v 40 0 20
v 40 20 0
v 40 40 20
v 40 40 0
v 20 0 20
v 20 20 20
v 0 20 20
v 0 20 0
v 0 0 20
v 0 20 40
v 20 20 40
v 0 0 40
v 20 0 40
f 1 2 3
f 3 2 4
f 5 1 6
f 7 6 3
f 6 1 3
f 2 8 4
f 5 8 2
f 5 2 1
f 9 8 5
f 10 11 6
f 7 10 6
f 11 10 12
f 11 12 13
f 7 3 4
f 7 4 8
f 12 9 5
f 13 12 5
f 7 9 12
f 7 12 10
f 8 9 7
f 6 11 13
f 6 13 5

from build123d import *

# Parameters (mm, degrees)
SKETCH1_W           = 40
SKETCH1_H           = 40
BOSS_EXTRUDE1_DEPTH = 40
CUT_EXTRUDE1_DEPTH  = 40
SKETCH3_W           = 20
SKETCH3_H           = 20
CUT_EXTRUDE2_DEPTH  = 40
SKETCH5_W           = 20
SKETCH5_H           = 20
CUT_EXTRUDE4_DEPTH  = 40
CUT_EXTRUDE5_DEPTH  = 40


with BuildPart() as part:
    # Sketch1 → Boss-Extrude1 (new body)
    with BuildSketch(Plane.XY):
        with Locations((20, 20)):
            Rectangle(SKETCH1_W, SKETCH1_H)
    extrude(amount=BOSS_EXTRUDE1_DEPTH)

    # Sketch2 → Cut-Extrude1 (cut)
    with BuildSketch(Plane.XY.offset(40)):
        Polygon((40, 40), (0, 20), (0, 40), align=None)
    extrude(amount=-CUT_EXTRUDE1_DEPTH, mode=Mode.SUBTRACT)

    # Sketch3 → Cut-Extrude2 (cut)
    with BuildSketch(Plane(origin=(40, 0, 0), x_dir=(0, 0, -1), z_dir=(1, 0, 0))):
        with Locations((-30, 30)):
            Rectangle(SKETCH3_W, SKETCH3_H)
    extrude(amount=-CUT_EXTRUDE2_DEPTH, mode=Mode.SUBTRACT)

    # Sketch5 → Cut-Extrude4 (cut)
    with BuildSketch(Plane(origin=(0, 20, 0), x_dir=(1, 0, 0), z_dir=(0, 1, 0))):
        with Locations((30, -30)):
            Rectangle(SKETCH5_W, SKETCH5_H)
    extrude(amount=-CUT_EXTRUDE4_DEPTH, mode=Mode.SUBTRACT)

    # Sketch6 → Cut-Extrude5 (cut)
    with BuildSketch(Plane.ZY):
        Polygon((0, 20), (20, 0), (0, 0), align=None)
    extrude(amount=-CUT_EXTRUDE5_DEPTH, mode=Mode.SUBTRACT)


solid = part.part
